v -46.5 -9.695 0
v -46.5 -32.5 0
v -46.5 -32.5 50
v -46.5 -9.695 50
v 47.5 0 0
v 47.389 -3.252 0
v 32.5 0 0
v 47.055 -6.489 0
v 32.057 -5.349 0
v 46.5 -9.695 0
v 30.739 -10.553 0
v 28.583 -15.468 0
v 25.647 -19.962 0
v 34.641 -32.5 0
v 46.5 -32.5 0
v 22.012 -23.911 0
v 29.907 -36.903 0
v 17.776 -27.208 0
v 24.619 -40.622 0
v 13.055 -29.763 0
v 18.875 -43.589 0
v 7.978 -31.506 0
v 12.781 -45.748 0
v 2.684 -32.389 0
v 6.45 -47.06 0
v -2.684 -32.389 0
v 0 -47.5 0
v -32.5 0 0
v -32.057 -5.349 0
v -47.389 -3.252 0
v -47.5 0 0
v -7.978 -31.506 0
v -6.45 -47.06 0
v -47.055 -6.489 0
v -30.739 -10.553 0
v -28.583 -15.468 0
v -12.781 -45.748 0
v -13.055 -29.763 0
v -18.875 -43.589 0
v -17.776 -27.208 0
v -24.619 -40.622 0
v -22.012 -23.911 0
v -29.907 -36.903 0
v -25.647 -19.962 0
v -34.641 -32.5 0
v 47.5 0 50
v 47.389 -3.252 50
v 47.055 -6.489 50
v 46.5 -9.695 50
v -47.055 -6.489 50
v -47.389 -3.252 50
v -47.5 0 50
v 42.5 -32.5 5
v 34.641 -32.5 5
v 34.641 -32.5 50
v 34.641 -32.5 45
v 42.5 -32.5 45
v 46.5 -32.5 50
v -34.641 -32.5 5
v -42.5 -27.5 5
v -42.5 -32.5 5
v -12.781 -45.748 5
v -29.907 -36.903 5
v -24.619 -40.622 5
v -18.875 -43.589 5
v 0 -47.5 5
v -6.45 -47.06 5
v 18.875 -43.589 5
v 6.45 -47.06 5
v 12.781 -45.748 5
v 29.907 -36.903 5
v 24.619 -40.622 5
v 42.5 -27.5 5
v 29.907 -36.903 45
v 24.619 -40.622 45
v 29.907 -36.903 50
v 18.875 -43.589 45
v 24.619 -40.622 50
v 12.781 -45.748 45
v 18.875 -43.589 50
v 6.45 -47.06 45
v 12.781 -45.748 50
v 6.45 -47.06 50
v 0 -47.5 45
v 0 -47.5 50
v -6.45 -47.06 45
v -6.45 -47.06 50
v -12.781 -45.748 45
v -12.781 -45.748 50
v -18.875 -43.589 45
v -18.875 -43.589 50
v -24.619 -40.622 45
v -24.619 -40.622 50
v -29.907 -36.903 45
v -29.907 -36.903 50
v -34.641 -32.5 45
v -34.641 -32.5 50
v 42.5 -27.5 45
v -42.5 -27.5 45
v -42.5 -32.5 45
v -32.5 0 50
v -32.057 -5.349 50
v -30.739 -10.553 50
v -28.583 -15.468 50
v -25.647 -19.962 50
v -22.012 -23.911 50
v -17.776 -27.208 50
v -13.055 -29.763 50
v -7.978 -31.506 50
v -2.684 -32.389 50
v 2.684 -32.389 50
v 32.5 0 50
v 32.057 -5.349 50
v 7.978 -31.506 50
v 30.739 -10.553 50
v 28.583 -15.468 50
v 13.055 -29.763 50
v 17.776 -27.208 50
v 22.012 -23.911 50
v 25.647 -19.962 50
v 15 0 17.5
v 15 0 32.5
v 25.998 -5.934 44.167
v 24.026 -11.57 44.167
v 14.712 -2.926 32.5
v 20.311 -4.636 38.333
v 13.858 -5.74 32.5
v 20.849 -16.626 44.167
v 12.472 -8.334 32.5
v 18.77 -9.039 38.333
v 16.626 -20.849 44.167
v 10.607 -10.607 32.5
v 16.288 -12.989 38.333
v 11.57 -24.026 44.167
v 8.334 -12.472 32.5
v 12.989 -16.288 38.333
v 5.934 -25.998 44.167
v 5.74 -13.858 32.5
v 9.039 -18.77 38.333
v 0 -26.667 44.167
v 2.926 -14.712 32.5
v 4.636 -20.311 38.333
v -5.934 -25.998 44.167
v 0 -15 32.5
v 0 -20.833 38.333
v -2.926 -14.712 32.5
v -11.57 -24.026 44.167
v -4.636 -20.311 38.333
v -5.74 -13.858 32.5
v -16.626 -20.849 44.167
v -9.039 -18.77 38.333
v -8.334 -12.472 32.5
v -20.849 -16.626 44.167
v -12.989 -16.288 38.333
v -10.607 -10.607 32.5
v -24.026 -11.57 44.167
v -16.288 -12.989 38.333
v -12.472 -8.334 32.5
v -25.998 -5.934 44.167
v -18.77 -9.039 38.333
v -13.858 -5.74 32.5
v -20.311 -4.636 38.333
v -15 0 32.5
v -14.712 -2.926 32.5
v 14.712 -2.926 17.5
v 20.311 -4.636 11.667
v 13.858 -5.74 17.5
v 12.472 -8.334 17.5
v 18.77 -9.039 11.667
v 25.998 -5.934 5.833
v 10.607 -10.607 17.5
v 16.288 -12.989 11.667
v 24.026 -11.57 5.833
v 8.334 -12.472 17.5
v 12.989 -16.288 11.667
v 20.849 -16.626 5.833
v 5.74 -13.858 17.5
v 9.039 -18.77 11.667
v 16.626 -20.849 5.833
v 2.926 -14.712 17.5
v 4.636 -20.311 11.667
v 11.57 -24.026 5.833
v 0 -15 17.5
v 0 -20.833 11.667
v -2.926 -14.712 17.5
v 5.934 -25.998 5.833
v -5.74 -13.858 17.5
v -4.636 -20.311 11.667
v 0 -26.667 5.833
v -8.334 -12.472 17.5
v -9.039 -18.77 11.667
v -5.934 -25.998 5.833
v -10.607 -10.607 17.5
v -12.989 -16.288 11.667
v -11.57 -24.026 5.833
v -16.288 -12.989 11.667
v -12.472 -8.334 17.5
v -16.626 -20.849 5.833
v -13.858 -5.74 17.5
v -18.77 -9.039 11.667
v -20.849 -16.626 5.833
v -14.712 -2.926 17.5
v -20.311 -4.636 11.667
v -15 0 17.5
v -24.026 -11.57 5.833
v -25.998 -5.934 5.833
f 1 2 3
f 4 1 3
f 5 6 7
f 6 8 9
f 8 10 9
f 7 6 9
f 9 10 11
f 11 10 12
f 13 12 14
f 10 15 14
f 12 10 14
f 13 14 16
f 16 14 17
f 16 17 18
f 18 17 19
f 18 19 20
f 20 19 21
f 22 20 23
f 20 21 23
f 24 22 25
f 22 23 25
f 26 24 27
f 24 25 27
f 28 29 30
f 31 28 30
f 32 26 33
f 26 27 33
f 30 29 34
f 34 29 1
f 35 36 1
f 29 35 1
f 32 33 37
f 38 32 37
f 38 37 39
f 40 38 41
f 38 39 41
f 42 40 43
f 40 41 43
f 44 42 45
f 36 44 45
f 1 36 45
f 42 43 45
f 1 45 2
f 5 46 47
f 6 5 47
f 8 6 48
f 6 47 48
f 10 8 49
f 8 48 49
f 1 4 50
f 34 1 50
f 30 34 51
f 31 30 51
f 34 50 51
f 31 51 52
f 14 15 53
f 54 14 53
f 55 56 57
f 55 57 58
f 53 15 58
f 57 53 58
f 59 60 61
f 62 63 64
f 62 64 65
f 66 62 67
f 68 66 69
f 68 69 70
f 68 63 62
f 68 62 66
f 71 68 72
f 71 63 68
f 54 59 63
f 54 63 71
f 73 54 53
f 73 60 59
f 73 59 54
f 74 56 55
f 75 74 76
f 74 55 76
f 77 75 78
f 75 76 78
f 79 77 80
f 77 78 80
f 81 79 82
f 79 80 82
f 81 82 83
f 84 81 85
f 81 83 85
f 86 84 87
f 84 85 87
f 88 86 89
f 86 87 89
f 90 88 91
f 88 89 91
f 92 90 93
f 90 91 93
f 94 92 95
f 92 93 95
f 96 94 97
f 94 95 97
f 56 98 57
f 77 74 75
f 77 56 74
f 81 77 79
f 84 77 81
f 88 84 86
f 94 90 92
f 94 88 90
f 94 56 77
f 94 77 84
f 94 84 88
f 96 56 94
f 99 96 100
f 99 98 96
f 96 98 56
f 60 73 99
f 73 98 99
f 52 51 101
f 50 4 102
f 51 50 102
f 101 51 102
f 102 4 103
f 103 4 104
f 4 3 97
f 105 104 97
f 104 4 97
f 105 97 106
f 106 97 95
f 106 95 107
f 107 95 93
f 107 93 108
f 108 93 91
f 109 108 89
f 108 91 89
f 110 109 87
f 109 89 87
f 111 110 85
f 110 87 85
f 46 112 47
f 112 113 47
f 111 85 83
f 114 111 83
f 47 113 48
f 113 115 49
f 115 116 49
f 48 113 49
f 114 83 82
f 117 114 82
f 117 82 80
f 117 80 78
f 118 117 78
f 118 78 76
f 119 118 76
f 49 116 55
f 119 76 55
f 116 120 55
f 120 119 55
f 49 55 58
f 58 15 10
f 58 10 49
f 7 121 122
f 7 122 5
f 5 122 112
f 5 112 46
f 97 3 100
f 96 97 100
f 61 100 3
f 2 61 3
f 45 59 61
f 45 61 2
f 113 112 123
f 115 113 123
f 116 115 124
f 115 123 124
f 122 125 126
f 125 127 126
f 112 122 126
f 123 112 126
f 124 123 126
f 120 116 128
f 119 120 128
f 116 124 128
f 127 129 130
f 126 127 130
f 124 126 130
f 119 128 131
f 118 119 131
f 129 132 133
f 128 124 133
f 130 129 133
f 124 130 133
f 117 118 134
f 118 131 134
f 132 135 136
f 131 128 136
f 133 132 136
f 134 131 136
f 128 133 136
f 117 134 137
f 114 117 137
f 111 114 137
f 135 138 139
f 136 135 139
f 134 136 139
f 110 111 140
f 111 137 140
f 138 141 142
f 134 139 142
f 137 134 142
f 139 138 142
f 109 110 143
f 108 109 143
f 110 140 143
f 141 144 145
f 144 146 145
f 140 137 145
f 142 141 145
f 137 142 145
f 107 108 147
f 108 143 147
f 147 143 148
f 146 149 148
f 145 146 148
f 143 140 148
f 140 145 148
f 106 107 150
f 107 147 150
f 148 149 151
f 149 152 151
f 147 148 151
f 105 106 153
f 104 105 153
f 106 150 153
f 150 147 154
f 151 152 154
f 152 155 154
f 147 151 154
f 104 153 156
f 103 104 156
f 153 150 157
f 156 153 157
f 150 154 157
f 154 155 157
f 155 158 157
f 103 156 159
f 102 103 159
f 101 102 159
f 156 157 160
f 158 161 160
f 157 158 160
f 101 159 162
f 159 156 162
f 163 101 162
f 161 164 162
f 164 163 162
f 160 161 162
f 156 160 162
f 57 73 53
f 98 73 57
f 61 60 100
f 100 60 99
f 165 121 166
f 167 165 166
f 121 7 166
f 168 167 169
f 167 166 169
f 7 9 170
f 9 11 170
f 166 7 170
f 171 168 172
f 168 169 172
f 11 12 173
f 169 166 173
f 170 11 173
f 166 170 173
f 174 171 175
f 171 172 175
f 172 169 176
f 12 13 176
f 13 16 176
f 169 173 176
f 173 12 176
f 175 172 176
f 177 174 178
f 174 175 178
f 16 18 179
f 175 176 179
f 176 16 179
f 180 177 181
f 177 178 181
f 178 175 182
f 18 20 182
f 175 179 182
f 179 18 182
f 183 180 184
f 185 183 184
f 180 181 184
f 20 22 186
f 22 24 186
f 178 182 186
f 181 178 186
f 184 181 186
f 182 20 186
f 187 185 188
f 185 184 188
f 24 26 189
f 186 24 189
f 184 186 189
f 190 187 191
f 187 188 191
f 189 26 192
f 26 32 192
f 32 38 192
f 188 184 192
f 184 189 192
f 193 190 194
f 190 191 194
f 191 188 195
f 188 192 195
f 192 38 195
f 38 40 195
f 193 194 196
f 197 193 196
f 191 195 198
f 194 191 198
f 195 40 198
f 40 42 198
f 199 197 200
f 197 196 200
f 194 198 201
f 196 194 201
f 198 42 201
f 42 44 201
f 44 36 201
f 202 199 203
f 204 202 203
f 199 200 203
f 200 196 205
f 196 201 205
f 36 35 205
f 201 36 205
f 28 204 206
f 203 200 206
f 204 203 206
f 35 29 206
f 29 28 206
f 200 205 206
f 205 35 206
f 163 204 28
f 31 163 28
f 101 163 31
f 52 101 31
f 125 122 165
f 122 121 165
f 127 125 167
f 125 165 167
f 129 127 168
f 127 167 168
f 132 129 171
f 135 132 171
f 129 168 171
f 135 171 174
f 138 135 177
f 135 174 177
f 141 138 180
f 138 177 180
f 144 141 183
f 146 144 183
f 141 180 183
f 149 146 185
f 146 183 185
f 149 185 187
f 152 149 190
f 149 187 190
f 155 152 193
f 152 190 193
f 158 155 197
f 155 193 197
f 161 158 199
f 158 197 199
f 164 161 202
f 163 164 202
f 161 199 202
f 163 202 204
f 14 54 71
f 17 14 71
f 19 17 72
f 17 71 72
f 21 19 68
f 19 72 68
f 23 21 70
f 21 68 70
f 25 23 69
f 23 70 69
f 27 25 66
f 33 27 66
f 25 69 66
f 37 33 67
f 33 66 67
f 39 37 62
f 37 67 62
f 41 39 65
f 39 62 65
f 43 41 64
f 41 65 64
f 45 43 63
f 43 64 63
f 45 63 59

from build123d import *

# Parameters (mm, degrees)
SKETCH006_AS_DRAWN_W                 = 85
SKETCH006_AS_DRAWN_H                 = 40
EXTRUDE002_DEPTH                     = 80
EXTRUDE002_ONTO_SKETCH006_ROLL_ANGLE = 90
SKETCH005_R                          = 39.095168
EXTRUDE001_DEPTH                     = 60
EXTRUDE_DEPTH                        = 5
SKETCH004_W                          = 93
SKETCH004_H                          = 50
PAD_DEPTH                            = 20
REVOLUTION_ANGLE                     = -180


with BuildPart() as extrude002:
    # Sketch006 as drawn → Extrude002 (new)
    with BuildSketch(Plane.XY):
        with Locations((0, 25)):
            Rectangle(SKETCH006_AS_DRAWN_W, SKETCH006_AS_DRAWN_H)
    extrude(amount=EXTRUDE002_DEPTH)


with BuildPart() as extrude002_1:
    # Extrude002 onto Sketch006 roll: moved
    add(extrude002.part.rotate(Axis((0, 0, 0), (1, 0, 0)), EXTRUDE002_ONTO_SKETCH006_ROLL_ANGLE))


with BuildPart() as extrude002_2:
    # Extrude002 onto Sketch006 placement: moved
    add(extrude002_1.part.moved(Location((0, -27.5, 0))))


with BuildPart() as extrude001:
    # Sketch005 → Extrude001 (new body)
    with BuildSketch(Plane(origin=(0, 0, 0), x_dir=(1, 0, 0), z_dir=(0, 0, -1))):
        Circle(SKETCH005_R)
    extrude(amount=-EXTRUDE001_DEPTH)


with BuildPart() as cut:
    # Sketch003 → Extrude (new body)
    with BuildSketch(Plane(origin=(-42.5, -27.5, 45), x_dir=(0, 0, 1), z_dir=(0, 1, 0))):
        Polygon((0, 64), (5, 64), (5, 89), (-45, 89), (-45, 64), (-40, 64), (-40, 85), (0, 85), align=None)
        Polygon((0, 21), (5, 21), (5, -4), (-45, -4), (-45, 21), (-40, 21), (-40, 0), (0, 0), align=None)
    extrude(amount=-EXTRUDE_DEPTH)

    # Sketch004 → Pad (new body)
    with BuildSketch(Plane(origin=(0, -27.5, 0), x_dir=(-1, 0, 0), z_dir=(0, 1, 0))):
        with Locations((0, 25)):
            Rectangle(SKETCH004_W, SKETCH004_H)
    extrude(amount=PAD_DEPTH)

    # Cut: cut Extrude001
    add(extrude001.part, mode=Mode.SUBTRACT)


with BuildPart() as cut001:
    # Sketch → Revolution (revolve)
    with BuildSketch(Plane.XZ):
        Polygon((32.5, 50), (15, 32.5), (15, 17.5), (32.5, 0), (47.5, 0), (47.5, 50), align=None)
    revolve(axis=Axis((0, 0, 0), (0, 0, 1)), revolution_arc=REVOLUTION_ANGLE)

    # Fusion: union Cut
    add(cut.part)

    # Cut001: cut Extrude002
    add(extrude002_2.part, mode=Mode.SUBTRACT)


solid = cut001.part
